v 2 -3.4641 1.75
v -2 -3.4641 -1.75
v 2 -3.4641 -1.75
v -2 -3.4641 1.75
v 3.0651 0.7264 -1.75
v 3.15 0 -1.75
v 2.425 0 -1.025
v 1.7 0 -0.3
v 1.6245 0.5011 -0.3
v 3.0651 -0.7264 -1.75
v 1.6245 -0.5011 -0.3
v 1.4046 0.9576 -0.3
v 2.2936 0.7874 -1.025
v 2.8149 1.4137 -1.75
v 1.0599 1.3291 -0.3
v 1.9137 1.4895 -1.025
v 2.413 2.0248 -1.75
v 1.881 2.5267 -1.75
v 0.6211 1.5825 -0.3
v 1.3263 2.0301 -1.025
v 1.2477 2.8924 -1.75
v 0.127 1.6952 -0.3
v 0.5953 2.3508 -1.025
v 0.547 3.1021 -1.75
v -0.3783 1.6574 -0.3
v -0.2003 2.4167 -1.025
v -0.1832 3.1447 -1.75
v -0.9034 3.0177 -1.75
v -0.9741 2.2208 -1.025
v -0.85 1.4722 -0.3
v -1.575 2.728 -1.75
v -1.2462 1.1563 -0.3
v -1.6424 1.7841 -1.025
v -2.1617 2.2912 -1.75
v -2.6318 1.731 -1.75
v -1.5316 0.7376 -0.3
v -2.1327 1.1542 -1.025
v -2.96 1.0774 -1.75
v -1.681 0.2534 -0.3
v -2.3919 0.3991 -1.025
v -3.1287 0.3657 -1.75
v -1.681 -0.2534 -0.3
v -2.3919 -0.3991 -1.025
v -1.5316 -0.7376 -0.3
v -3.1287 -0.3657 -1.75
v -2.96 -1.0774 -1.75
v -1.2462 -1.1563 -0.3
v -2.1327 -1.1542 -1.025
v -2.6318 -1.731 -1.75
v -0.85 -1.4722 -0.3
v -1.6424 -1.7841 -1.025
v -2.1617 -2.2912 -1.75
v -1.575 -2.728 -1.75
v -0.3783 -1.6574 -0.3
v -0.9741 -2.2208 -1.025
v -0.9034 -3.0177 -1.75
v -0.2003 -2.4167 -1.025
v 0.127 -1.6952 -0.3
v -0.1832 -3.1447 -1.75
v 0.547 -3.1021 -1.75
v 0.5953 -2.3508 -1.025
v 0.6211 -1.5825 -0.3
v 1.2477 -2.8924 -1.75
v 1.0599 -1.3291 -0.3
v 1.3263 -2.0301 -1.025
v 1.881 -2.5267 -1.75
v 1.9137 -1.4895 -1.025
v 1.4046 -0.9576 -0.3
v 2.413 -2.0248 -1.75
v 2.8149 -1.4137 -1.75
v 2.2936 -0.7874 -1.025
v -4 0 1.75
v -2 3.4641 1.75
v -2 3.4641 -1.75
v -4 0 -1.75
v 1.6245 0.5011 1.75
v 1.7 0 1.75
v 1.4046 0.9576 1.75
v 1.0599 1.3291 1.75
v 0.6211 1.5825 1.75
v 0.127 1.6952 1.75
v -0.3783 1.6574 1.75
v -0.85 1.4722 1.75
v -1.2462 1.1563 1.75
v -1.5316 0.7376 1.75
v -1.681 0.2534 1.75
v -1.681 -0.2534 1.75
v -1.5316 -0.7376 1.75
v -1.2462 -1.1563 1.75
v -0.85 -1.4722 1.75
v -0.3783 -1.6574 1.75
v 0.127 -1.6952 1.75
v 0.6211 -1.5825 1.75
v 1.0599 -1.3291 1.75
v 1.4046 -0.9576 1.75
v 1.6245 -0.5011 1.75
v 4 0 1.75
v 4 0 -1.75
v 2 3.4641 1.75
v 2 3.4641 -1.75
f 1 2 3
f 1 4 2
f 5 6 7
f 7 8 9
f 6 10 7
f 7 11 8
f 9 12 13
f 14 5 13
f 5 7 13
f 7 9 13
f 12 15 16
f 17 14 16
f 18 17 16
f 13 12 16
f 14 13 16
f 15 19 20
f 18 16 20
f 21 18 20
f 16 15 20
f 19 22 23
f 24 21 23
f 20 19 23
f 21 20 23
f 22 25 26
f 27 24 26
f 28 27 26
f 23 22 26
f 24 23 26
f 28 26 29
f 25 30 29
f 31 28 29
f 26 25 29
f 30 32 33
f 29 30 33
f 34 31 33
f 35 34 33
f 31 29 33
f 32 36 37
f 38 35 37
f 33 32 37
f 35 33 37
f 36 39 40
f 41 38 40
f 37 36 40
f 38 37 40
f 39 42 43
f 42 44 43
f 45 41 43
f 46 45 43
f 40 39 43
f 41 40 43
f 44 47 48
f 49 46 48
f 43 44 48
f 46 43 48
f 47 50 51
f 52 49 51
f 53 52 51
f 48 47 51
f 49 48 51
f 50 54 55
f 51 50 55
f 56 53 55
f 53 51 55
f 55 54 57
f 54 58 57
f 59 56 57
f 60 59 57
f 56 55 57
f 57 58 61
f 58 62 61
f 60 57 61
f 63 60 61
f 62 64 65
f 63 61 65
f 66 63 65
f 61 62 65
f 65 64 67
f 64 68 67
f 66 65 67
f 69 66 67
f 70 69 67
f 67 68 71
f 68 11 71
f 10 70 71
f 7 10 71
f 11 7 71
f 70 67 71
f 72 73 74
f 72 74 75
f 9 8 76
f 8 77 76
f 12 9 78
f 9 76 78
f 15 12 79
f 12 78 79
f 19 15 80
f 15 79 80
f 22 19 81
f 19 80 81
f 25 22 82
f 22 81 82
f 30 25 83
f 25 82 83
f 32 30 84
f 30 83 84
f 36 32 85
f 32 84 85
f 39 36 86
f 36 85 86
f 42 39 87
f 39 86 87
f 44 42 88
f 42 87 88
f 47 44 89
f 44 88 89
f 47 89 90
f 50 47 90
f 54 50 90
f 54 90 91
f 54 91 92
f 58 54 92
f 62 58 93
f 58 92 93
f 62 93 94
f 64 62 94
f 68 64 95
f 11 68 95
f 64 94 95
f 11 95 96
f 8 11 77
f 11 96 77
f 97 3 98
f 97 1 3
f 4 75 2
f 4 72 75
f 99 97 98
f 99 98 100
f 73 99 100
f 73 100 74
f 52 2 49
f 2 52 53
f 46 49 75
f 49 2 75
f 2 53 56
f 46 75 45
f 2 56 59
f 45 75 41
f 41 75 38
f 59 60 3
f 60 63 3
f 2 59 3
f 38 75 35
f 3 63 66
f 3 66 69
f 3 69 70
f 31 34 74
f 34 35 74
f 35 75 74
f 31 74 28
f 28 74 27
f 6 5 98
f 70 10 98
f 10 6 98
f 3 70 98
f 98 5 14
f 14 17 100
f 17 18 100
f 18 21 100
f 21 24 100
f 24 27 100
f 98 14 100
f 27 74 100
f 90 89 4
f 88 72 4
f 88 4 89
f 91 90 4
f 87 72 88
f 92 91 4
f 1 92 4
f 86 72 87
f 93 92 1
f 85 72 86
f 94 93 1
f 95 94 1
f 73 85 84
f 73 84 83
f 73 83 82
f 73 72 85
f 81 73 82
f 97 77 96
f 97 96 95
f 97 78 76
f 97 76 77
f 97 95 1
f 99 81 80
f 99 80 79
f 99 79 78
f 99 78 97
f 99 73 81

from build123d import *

# Parameters (mm, degrees)
BOSS_EXTRUDE1_DEPTH                                 = 1.75
CSK_FOR_M3_COUNTERSUNK_FLAT_HEAD_SCREW1_D           = 3.4
CSK_FOR_M3_COUNTERSUNK_FLAT_HEAD_SCREW1_DEPTH       = 3.5
CSK_FOR_M3_COUNTERSUNK_FLAT_HEAD_SCREW1_CSINK_D     = 6.3
CSK_FOR_M3_COUNTERSUNK_FLAT_HEAD_SCREW1_CSINK_ANGLE = 90
CSK_FOR_M3_COUNTERSUNK_FLAT_HEAD_SCREW1_TIP         = 1.021463052


with BuildPart() as part:
    # Sketch1 → Boss-Extrude1 (new, symmetric)
    with BuildSketch(Plane.XY):
        Polygon((2, -3.464101615), (4, 0), (2, 3.464101615), (-2, 3.464101615), (-4, 0), (-2, -3.464101615), align=None)
    extrude(amount=BOSS_EXTRUDE1_DEPTH, both=True)

    # CSK for M3 Countersunk Flat Head Screw1
    with Locations(Plane(origin=(0, 0, -1.75), x_dir=(-1, 0, 0), z_dir=(0, 0, -1))):
        with Locations((0, 0)):
            CounterSinkHole(CSK_FOR_M3_COUNTERSUNK_FLAT_HEAD_SCREW1_D / 2, CSK_FOR_M3_COUNTERSUNK_FLAT_HEAD_SCREW1_CSINK_D / 2, depth=CSK_FOR_M3_COUNTERSUNK_FLAT_HEAD_SCREW1_DEPTH, counter_sink_angle=CSK_FOR_M3_COUNTERSUNK_FLAT_HEAD_SCREW1_CSINK_ANGLE)
            with Locations((0, 0, -(CSK_FOR_M3_COUNTERSUNK_FLAT_HEAD_SCREW1_DEPTH + CSK_FOR_M3_COUNTERSUNK_FLAT_HEAD_SCREW1_TIP / 2))):  # 118° drill point
                Cone(0, CSK_FOR_M3_COUNTERSUNK_FLAT_HEAD_SCREW1_D / 2, CSK_FOR_M3_COUNTERSUNK_FLAT_HEAD_SCREW1_TIP, mode=Mode.SUBTRACT)


solid = part.part
